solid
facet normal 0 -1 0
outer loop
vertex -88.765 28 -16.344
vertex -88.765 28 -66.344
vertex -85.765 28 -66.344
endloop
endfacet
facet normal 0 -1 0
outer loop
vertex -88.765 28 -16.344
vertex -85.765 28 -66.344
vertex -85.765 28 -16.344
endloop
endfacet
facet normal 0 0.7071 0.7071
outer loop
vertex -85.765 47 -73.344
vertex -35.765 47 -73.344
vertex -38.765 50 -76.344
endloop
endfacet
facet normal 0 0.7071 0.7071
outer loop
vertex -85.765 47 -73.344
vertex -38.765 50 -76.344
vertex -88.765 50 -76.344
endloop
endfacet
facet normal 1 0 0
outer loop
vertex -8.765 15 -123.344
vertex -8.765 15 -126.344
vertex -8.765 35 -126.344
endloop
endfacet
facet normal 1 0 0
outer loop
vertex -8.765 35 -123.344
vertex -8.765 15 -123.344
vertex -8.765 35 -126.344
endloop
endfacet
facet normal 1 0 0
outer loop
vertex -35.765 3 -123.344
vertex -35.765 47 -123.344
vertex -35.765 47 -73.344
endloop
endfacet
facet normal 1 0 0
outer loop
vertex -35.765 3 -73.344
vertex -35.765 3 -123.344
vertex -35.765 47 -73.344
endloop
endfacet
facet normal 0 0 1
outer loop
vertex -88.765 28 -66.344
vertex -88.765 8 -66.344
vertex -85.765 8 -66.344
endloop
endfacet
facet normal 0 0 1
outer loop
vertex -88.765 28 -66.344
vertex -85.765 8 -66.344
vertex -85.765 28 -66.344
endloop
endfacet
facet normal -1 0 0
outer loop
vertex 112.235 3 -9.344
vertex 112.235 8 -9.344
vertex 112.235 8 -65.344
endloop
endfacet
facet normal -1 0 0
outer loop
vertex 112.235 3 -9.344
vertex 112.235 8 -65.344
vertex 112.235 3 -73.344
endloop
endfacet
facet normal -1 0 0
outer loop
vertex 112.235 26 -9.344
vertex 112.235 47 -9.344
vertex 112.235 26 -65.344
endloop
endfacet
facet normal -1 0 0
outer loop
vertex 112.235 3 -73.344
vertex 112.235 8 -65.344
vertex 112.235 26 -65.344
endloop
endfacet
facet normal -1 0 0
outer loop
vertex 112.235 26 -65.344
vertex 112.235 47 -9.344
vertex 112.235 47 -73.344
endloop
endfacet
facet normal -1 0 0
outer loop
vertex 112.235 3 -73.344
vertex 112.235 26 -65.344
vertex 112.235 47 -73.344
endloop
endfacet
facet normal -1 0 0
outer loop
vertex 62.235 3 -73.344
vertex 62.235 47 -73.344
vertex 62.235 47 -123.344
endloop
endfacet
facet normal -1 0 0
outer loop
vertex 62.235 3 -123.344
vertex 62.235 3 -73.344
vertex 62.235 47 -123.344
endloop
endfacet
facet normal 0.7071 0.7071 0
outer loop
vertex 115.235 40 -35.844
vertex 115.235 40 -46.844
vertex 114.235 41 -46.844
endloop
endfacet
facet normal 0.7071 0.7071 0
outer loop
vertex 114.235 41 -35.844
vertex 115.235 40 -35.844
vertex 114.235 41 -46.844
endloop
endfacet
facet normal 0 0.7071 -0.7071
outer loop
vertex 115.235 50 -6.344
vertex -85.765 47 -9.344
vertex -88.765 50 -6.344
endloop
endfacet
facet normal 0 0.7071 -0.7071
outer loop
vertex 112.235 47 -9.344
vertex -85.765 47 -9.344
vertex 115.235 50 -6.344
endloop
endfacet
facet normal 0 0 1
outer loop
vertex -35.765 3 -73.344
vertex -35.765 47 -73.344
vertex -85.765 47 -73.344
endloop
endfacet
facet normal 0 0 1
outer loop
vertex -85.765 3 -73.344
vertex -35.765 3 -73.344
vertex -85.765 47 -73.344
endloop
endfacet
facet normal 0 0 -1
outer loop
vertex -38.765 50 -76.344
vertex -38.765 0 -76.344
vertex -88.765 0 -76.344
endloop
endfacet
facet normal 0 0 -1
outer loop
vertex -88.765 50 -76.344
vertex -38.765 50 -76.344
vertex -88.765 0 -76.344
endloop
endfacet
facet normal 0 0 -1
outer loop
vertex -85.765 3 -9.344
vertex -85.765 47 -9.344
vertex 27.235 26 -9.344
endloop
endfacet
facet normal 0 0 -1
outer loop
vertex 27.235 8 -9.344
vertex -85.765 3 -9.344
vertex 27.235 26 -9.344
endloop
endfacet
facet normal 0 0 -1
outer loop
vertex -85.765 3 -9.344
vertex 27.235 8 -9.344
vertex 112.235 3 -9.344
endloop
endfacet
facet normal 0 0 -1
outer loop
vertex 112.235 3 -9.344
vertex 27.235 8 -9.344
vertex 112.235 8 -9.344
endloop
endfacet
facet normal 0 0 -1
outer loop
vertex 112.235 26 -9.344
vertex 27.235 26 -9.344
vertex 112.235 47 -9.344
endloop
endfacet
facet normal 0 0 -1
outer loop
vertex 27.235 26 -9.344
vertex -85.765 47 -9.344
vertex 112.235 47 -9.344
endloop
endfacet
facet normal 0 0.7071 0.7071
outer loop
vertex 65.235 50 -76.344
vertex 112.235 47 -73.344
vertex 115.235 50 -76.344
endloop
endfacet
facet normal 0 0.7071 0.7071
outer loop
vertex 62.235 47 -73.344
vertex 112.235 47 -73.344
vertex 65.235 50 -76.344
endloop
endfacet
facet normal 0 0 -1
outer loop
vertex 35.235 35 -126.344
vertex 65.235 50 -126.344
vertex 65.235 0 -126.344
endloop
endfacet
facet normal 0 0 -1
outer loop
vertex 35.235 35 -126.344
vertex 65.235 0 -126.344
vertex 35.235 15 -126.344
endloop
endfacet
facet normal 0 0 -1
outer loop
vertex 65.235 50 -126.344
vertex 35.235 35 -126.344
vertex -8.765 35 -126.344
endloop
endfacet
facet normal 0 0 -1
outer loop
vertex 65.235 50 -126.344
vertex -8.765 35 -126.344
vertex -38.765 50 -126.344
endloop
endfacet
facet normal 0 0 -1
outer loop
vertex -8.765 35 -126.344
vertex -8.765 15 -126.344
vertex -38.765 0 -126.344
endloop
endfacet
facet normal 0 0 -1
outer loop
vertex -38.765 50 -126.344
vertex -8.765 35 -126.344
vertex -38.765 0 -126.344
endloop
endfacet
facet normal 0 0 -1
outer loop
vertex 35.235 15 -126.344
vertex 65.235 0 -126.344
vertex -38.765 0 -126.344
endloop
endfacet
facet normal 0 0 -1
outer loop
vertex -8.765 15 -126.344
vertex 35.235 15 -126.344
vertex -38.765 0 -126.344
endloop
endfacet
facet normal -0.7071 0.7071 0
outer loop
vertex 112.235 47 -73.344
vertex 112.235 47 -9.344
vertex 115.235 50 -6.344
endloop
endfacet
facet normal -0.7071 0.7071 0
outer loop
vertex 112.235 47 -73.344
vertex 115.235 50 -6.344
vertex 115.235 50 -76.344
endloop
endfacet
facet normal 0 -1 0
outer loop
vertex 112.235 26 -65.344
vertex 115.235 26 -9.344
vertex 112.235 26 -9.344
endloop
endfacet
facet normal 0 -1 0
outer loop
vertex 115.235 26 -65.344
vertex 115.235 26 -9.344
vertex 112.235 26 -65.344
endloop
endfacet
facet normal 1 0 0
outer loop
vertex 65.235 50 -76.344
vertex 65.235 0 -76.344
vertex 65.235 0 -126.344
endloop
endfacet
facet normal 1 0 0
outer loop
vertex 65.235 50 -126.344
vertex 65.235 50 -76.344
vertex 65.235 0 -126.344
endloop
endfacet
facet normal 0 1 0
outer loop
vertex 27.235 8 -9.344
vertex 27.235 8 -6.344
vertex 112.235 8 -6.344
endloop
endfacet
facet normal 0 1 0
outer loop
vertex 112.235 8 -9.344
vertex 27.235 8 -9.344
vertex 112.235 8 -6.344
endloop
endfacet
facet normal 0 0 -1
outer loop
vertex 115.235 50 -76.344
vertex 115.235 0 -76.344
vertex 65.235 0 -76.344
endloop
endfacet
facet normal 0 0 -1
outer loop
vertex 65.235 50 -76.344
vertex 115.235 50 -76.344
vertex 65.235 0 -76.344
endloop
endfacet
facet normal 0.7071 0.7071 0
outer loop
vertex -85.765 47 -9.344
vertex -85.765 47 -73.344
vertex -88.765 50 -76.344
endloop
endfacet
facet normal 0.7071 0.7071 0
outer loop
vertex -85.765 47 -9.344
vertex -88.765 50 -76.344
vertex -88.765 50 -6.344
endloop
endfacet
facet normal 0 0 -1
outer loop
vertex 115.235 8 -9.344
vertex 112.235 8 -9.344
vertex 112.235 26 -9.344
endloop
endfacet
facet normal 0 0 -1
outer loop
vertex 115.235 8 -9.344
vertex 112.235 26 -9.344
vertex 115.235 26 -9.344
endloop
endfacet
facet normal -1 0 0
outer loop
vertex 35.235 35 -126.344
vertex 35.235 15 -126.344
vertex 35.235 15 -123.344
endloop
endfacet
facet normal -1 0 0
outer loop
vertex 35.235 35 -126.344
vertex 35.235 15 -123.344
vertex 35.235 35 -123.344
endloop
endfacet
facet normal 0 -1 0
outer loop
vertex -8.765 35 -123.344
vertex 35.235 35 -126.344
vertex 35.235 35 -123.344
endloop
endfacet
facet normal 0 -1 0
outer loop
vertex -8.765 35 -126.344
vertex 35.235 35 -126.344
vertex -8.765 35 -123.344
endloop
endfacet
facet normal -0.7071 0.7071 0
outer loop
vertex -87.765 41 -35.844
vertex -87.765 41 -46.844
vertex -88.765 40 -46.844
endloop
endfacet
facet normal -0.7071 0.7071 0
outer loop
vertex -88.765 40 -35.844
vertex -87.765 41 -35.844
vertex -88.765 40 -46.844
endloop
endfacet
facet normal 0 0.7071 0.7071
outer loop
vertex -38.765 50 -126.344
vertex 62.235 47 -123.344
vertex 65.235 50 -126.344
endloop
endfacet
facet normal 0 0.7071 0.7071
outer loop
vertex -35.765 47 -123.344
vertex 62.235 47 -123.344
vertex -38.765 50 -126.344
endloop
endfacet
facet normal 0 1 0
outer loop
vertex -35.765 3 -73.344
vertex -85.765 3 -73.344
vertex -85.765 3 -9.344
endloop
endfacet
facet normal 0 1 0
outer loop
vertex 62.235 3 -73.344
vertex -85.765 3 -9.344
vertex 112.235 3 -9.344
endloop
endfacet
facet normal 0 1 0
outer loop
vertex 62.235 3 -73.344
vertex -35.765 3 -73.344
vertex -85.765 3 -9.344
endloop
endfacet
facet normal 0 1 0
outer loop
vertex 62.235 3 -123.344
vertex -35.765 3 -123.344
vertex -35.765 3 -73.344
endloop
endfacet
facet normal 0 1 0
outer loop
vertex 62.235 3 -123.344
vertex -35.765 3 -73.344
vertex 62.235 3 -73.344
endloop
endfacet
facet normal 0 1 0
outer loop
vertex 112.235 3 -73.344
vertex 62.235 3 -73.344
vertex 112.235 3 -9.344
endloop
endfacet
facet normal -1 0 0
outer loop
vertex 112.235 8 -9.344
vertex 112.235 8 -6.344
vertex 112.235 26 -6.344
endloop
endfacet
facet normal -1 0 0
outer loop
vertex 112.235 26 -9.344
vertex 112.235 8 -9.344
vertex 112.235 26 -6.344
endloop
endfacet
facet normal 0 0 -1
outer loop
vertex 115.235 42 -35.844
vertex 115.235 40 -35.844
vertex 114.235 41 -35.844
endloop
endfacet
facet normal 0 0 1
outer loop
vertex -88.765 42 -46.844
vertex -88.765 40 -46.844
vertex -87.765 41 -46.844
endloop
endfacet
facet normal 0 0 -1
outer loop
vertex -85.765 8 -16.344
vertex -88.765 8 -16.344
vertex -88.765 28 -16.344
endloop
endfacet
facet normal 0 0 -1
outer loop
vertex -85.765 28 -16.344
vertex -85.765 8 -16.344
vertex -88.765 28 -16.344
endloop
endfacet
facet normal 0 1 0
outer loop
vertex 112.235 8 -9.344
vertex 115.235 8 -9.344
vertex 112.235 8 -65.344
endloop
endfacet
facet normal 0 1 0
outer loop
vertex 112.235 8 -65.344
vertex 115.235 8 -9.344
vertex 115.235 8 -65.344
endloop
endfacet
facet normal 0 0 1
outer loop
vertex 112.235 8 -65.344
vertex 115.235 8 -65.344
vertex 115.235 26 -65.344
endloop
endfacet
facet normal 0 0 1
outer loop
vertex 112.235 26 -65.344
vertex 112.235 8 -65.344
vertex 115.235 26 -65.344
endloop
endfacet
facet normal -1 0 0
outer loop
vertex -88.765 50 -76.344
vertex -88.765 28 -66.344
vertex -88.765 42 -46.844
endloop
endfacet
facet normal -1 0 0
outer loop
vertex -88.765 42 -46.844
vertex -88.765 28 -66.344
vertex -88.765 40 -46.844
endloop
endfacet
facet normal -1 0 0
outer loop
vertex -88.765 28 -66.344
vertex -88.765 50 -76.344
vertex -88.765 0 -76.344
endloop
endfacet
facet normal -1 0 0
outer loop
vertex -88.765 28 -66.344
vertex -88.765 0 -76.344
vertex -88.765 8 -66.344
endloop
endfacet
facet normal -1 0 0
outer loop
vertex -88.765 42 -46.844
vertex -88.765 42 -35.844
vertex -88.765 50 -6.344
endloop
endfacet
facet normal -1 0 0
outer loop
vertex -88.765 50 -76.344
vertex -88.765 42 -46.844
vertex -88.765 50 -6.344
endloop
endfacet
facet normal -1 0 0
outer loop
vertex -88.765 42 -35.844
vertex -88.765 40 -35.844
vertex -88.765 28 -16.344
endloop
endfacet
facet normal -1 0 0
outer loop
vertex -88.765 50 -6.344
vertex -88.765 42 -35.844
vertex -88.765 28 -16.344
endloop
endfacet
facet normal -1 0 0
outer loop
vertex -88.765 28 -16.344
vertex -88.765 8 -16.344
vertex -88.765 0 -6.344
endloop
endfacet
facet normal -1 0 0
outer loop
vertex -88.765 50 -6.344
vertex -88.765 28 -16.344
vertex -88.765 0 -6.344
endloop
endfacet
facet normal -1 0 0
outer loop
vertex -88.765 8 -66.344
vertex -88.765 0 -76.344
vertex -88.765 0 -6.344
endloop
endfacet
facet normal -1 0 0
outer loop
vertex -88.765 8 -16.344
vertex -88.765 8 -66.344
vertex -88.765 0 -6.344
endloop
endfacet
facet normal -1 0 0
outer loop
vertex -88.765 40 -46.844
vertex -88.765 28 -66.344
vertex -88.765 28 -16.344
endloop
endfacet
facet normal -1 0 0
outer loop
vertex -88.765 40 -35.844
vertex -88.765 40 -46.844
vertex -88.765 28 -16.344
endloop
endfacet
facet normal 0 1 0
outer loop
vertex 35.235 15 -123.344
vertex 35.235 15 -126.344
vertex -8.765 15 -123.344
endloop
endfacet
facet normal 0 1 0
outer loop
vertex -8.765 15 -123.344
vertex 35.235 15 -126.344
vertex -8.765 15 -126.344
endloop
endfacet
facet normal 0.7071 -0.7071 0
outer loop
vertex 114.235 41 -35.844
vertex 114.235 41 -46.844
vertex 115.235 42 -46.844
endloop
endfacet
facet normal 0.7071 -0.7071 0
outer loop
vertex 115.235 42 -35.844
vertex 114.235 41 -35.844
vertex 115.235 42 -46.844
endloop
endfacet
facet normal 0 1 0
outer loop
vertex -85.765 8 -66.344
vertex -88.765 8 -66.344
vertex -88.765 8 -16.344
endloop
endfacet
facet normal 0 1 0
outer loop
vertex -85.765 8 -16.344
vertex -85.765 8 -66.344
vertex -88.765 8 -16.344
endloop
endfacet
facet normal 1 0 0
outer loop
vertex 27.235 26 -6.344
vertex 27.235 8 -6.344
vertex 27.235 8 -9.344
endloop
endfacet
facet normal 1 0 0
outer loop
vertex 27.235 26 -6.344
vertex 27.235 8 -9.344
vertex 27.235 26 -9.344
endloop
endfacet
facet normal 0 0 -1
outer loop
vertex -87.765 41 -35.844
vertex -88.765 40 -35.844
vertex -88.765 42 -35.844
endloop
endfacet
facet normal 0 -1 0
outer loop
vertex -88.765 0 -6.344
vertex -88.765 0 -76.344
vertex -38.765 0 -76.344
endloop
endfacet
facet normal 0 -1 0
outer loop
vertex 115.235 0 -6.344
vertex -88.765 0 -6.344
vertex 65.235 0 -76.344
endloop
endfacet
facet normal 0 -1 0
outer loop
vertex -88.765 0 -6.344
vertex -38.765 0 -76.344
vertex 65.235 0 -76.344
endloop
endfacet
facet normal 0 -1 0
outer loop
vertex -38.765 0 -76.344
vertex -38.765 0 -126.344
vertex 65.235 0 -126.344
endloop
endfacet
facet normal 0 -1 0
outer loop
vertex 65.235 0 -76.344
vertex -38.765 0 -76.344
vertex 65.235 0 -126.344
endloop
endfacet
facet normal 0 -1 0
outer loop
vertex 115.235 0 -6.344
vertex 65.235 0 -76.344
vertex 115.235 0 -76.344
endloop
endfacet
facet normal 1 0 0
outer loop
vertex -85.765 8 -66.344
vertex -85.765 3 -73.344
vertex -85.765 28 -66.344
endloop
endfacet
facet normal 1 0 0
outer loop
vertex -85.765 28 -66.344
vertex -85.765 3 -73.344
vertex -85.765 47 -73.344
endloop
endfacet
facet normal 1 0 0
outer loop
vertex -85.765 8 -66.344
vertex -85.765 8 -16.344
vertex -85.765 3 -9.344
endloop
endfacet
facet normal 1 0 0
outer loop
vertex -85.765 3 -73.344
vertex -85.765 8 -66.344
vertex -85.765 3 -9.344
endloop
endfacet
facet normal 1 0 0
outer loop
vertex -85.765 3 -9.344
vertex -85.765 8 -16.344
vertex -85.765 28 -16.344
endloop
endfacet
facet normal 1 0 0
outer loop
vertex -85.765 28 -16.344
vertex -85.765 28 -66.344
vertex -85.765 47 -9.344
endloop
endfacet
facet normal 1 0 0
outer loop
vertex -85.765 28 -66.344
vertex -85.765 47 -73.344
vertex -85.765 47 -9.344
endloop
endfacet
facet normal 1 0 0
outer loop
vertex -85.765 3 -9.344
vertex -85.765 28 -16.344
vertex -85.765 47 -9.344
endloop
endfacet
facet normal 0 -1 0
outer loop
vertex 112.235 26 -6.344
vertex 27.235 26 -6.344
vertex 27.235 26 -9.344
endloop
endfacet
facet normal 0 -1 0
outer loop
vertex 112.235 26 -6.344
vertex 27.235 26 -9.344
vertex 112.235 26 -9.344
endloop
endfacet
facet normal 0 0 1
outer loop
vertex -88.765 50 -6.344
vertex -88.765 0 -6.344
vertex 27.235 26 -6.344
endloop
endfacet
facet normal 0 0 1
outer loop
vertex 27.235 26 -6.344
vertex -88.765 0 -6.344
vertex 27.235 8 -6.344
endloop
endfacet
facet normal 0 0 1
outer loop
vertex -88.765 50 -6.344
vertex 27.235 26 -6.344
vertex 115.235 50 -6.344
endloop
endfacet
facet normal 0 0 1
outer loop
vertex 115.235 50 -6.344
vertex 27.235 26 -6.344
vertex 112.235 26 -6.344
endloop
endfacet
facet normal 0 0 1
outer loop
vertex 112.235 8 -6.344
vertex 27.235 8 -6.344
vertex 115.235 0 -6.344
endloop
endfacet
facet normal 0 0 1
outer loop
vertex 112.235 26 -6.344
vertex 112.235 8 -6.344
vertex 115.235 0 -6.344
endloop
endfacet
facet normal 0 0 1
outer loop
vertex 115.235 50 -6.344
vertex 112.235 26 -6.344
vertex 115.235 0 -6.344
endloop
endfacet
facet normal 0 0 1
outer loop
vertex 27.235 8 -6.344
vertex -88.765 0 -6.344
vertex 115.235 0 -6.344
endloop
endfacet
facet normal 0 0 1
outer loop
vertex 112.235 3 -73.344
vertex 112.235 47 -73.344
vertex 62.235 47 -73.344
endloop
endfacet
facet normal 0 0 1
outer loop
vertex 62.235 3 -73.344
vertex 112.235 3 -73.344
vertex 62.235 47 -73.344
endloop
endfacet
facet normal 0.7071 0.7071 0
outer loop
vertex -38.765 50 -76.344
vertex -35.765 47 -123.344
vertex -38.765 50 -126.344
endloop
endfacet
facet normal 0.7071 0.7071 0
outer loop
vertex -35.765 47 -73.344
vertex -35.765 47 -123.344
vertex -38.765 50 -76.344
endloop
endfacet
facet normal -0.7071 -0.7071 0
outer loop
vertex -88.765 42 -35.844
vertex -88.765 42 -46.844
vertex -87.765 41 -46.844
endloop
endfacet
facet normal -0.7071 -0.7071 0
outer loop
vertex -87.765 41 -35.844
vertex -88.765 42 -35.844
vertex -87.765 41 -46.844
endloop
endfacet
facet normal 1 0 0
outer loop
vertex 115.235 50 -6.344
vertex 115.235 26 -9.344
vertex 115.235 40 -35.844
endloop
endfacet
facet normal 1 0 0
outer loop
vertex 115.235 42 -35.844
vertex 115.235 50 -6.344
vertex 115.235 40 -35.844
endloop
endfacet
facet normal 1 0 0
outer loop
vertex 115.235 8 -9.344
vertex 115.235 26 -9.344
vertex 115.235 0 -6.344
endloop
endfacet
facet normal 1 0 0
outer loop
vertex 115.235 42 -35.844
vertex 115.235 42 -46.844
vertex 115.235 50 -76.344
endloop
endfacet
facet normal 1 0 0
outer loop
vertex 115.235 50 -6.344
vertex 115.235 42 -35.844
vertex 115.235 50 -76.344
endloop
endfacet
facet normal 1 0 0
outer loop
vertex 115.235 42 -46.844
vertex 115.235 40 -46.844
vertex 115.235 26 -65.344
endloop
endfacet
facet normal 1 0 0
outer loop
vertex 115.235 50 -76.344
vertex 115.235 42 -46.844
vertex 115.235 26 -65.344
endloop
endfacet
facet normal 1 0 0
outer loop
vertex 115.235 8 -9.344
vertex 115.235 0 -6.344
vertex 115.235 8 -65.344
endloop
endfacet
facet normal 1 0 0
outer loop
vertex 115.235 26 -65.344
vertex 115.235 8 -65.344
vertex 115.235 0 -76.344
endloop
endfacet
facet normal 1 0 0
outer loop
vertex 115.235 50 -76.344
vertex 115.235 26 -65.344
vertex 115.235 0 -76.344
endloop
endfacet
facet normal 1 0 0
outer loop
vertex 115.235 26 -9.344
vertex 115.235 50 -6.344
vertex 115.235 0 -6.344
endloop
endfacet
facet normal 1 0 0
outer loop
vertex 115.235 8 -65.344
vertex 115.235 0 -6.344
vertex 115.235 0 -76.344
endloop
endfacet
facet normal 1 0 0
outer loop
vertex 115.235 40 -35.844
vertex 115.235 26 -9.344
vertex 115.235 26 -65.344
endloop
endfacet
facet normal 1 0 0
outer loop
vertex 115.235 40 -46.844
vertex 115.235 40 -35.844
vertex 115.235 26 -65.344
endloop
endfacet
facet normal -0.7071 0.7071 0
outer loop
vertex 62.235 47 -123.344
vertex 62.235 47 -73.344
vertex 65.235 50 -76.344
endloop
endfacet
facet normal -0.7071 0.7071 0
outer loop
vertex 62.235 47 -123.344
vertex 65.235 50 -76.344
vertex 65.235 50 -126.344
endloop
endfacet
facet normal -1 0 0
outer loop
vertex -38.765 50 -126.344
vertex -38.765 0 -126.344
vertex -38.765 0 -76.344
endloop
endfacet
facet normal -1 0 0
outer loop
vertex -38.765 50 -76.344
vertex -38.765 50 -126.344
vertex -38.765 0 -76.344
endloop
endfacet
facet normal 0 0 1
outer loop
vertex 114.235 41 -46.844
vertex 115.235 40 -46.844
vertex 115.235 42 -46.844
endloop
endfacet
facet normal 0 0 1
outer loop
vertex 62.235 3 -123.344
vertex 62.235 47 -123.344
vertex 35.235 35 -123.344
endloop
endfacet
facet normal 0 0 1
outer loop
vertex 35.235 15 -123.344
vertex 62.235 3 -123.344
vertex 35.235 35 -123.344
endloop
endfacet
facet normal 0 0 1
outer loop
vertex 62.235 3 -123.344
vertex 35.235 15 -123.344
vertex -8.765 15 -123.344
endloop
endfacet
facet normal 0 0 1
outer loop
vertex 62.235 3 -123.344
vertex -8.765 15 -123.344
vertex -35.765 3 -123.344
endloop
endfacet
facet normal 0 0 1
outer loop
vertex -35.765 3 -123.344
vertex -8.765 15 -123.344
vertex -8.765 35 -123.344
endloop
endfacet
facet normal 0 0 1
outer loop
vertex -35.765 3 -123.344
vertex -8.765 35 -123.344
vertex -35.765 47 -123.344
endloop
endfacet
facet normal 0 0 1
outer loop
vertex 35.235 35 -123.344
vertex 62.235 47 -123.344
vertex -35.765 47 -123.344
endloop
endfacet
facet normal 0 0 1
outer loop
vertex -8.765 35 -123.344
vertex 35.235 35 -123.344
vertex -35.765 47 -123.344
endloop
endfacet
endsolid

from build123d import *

# Parameters (mm, degrees)
BOSS_EXTRUDE1_DEPTH = 50
CUT_EXTRUDE1_DEPTH  = 47
CHAMFER3_SIZE       = 3
SKETCH5_W           = 56
SKETCH5_H           = 18
CUT_EXTRUDE2_DEPTH  = 3
SKETCH6_W           = 85
SKETCH6_H           = 18
CUT_EXTRUDE3_DEPTH  = 3
SKETCH7_W           = 50
SKETCH7_H           = 20
CUT_EXTRUDE4_DEPTH  = 3
SKETCH8_W           = 44
SKETCH8_H           = 20
CUT_EXTRUDE5_DEPTH  = 3
SKETCH9_W           = 11
SKETCH9_H           = 2
CUT_EXTRUDE6_DEPTH  = 1
DRAFT3_START        = -46.843617021
DRAFT3_DEPTH        = 11
SKETCH12_W          = 11
SKETCH12_H          = 2
CUT_EXTRUDE7_DEPTH  = 1
DRAFT4_START        = -46.843617021
DRAFT4_DEPTH        = 11


# Read off the part's stored shape, not the designer's step: Draft3, Draft4
with BuildPart() as part:
    # Sketch1 → Boss-Extrude1 (new body)
    with BuildSketch(Plane(origin=(0, 0, 0), x_dir=(1, 0, 0), z_dir=(0, 1, 0))):
        Polygon((-88.764893617, 6.343617021), (115.235106383, 6.343617021), (115.235106383, 76.343617021), (65.235106383, 76.343617021), (65.235106383, 126.343617021), (-38.764893617, 126.343617021), (-38.764893617, 76.343617021), (-88.764893617, 76.343617021), align=None)
    extrude(amount=BOSS_EXTRUDE1_DEPTH)

    # Sketch4 → Cut-Extrude1 (cut)
    with BuildSketch(Plane(origin=(0, 50, 0), x_dir=(1, 0, 0), z_dir=(0, 1, 0))):
        Polygon((-35.764893617, 123.343617021), (-35.764893617, 73.343617021), (-85.764893617, 73.343617021), (-85.764893617, 9.343617021), (112.235106383, 9.343617021), (112.235106383, 73.343617021), (62.235106383, 73.343617021), (62.235106383, 123.343617021), align=None)
    extrude(amount=-CUT_EXTRUDE1_DEPTH, mode=Mode.SUBTRACT)

    # Chamfer3
    chamfer3_edges = [part.edges().sort_by_distance(p)[0] for p in [
        (13.235106383, 50, -123.343617021),
        (-35.764893617, 50, -98.343617021),
        (-60.764893617, 50, -73.343617021),
        (-85.764893617, 50, -41.343617021),
        (13.235106383, 50, -9.343617021),
        (112.235106383, 50, -41.343617021),
        (87.235106383, 50, -73.343617021),
        (62.235106383, 50, -98.343617021),
    ]]
    chamfer(chamfer3_edges, length=CHAMFER3_SIZE - 0.0001)  # a hair under: the kernel refuses the full size

    # Sketch5 → Cut-Extrude2 (cut)
    with BuildSketch(Plane(origin=(115.235106383, 0, 0), x_dir=(0, 0, -1), z_dir=(1, 0, 0))):
        with Locations((37.343617021, 17)):
            Rectangle(SKETCH5_W, SKETCH5_H)
    extrude(amount=-CUT_EXTRUDE2_DEPTH, mode=Mode.SUBTRACT)

    # Sketch6 → Cut-Extrude3 (cut)
    with BuildSketch(Plane.XY.offset(-6.343617021)):
        with Locations((69.735106383, 17)):
            Rectangle(SKETCH6_W, SKETCH6_H)
    extrude(amount=-CUT_EXTRUDE3_DEPTH, mode=Mode.SUBTRACT)

    # Sketch7 → Cut-Extrude4 (cut)
    with BuildSketch(Plane.ZY.offset(88.764893617)):
        with Locations((-41.343617021, 18)):
            Rectangle(SKETCH7_W, SKETCH7_H)
    extrude(amount=-CUT_EXTRUDE4_DEPTH, mode=Mode.SUBTRACT)

    # Sketch8 → Cut-Extrude5 (cut)
    with BuildSketch(Plane(origin=(0, 0, -126.343617021), x_dir=(-1, 0, 0), z_dir=(0, 0, -1))):
        with Locations((-13.235106383, 25)):
            Rectangle(SKETCH8_W, SKETCH8_H)
    extrude(amount=-CUT_EXTRUDE5_DEPTH, mode=Mode.SUBTRACT)

    # Sketch9 → Cut-Extrude6 (cut)
    with BuildSketch(Plane(origin=(115.235106383, 0, 0), x_dir=(0, 0, -1), z_dir=(1, 0, 0))):
        with Locations((41.343617021, 41)):
            Rectangle(SKETCH9_W, SKETCH9_H)
    extrude(amount=-CUT_EXTRUDE6_DEPTH, mode=Mode.SUBTRACT)

    # Draft3 outline → Draft3 (add)
    with BuildSketch(Plane.XY.offset(DRAFT3_START)):
        Polygon((114.235106383, 42), (114.235106383, 41), (115.235106383, 42), align=None)
        Polygon((115.235106383, 40), (114.235106383, 41), (114.235106383, 40), align=None)
    extrude(amount=DRAFT3_DEPTH)

    # Sketch12 → Cut-Extrude7 (cut)
    with BuildSketch(Plane.ZY.offset(88.764893617)):
        with Locations((-41.343617021, 41)):
            Rectangle(SKETCH12_W, SKETCH12_H)
    extrude(amount=-CUT_EXTRUDE7_DEPTH, mode=Mode.SUBTRACT)

    # Draft4 outline → Draft4 (add)
    with BuildSketch(Plane.XY.offset(DRAFT4_START)):
        Polygon((-87.764893617, 42), (-88.764893617, 42), (-87.764893617, 41), align=None)
        Polygon((-87.764893617, 40), (-87.764893617, 41), (-88.764893617, 40), align=None)
    extrude(amount=DRAFT4_DEPTH)


solid = part.part
